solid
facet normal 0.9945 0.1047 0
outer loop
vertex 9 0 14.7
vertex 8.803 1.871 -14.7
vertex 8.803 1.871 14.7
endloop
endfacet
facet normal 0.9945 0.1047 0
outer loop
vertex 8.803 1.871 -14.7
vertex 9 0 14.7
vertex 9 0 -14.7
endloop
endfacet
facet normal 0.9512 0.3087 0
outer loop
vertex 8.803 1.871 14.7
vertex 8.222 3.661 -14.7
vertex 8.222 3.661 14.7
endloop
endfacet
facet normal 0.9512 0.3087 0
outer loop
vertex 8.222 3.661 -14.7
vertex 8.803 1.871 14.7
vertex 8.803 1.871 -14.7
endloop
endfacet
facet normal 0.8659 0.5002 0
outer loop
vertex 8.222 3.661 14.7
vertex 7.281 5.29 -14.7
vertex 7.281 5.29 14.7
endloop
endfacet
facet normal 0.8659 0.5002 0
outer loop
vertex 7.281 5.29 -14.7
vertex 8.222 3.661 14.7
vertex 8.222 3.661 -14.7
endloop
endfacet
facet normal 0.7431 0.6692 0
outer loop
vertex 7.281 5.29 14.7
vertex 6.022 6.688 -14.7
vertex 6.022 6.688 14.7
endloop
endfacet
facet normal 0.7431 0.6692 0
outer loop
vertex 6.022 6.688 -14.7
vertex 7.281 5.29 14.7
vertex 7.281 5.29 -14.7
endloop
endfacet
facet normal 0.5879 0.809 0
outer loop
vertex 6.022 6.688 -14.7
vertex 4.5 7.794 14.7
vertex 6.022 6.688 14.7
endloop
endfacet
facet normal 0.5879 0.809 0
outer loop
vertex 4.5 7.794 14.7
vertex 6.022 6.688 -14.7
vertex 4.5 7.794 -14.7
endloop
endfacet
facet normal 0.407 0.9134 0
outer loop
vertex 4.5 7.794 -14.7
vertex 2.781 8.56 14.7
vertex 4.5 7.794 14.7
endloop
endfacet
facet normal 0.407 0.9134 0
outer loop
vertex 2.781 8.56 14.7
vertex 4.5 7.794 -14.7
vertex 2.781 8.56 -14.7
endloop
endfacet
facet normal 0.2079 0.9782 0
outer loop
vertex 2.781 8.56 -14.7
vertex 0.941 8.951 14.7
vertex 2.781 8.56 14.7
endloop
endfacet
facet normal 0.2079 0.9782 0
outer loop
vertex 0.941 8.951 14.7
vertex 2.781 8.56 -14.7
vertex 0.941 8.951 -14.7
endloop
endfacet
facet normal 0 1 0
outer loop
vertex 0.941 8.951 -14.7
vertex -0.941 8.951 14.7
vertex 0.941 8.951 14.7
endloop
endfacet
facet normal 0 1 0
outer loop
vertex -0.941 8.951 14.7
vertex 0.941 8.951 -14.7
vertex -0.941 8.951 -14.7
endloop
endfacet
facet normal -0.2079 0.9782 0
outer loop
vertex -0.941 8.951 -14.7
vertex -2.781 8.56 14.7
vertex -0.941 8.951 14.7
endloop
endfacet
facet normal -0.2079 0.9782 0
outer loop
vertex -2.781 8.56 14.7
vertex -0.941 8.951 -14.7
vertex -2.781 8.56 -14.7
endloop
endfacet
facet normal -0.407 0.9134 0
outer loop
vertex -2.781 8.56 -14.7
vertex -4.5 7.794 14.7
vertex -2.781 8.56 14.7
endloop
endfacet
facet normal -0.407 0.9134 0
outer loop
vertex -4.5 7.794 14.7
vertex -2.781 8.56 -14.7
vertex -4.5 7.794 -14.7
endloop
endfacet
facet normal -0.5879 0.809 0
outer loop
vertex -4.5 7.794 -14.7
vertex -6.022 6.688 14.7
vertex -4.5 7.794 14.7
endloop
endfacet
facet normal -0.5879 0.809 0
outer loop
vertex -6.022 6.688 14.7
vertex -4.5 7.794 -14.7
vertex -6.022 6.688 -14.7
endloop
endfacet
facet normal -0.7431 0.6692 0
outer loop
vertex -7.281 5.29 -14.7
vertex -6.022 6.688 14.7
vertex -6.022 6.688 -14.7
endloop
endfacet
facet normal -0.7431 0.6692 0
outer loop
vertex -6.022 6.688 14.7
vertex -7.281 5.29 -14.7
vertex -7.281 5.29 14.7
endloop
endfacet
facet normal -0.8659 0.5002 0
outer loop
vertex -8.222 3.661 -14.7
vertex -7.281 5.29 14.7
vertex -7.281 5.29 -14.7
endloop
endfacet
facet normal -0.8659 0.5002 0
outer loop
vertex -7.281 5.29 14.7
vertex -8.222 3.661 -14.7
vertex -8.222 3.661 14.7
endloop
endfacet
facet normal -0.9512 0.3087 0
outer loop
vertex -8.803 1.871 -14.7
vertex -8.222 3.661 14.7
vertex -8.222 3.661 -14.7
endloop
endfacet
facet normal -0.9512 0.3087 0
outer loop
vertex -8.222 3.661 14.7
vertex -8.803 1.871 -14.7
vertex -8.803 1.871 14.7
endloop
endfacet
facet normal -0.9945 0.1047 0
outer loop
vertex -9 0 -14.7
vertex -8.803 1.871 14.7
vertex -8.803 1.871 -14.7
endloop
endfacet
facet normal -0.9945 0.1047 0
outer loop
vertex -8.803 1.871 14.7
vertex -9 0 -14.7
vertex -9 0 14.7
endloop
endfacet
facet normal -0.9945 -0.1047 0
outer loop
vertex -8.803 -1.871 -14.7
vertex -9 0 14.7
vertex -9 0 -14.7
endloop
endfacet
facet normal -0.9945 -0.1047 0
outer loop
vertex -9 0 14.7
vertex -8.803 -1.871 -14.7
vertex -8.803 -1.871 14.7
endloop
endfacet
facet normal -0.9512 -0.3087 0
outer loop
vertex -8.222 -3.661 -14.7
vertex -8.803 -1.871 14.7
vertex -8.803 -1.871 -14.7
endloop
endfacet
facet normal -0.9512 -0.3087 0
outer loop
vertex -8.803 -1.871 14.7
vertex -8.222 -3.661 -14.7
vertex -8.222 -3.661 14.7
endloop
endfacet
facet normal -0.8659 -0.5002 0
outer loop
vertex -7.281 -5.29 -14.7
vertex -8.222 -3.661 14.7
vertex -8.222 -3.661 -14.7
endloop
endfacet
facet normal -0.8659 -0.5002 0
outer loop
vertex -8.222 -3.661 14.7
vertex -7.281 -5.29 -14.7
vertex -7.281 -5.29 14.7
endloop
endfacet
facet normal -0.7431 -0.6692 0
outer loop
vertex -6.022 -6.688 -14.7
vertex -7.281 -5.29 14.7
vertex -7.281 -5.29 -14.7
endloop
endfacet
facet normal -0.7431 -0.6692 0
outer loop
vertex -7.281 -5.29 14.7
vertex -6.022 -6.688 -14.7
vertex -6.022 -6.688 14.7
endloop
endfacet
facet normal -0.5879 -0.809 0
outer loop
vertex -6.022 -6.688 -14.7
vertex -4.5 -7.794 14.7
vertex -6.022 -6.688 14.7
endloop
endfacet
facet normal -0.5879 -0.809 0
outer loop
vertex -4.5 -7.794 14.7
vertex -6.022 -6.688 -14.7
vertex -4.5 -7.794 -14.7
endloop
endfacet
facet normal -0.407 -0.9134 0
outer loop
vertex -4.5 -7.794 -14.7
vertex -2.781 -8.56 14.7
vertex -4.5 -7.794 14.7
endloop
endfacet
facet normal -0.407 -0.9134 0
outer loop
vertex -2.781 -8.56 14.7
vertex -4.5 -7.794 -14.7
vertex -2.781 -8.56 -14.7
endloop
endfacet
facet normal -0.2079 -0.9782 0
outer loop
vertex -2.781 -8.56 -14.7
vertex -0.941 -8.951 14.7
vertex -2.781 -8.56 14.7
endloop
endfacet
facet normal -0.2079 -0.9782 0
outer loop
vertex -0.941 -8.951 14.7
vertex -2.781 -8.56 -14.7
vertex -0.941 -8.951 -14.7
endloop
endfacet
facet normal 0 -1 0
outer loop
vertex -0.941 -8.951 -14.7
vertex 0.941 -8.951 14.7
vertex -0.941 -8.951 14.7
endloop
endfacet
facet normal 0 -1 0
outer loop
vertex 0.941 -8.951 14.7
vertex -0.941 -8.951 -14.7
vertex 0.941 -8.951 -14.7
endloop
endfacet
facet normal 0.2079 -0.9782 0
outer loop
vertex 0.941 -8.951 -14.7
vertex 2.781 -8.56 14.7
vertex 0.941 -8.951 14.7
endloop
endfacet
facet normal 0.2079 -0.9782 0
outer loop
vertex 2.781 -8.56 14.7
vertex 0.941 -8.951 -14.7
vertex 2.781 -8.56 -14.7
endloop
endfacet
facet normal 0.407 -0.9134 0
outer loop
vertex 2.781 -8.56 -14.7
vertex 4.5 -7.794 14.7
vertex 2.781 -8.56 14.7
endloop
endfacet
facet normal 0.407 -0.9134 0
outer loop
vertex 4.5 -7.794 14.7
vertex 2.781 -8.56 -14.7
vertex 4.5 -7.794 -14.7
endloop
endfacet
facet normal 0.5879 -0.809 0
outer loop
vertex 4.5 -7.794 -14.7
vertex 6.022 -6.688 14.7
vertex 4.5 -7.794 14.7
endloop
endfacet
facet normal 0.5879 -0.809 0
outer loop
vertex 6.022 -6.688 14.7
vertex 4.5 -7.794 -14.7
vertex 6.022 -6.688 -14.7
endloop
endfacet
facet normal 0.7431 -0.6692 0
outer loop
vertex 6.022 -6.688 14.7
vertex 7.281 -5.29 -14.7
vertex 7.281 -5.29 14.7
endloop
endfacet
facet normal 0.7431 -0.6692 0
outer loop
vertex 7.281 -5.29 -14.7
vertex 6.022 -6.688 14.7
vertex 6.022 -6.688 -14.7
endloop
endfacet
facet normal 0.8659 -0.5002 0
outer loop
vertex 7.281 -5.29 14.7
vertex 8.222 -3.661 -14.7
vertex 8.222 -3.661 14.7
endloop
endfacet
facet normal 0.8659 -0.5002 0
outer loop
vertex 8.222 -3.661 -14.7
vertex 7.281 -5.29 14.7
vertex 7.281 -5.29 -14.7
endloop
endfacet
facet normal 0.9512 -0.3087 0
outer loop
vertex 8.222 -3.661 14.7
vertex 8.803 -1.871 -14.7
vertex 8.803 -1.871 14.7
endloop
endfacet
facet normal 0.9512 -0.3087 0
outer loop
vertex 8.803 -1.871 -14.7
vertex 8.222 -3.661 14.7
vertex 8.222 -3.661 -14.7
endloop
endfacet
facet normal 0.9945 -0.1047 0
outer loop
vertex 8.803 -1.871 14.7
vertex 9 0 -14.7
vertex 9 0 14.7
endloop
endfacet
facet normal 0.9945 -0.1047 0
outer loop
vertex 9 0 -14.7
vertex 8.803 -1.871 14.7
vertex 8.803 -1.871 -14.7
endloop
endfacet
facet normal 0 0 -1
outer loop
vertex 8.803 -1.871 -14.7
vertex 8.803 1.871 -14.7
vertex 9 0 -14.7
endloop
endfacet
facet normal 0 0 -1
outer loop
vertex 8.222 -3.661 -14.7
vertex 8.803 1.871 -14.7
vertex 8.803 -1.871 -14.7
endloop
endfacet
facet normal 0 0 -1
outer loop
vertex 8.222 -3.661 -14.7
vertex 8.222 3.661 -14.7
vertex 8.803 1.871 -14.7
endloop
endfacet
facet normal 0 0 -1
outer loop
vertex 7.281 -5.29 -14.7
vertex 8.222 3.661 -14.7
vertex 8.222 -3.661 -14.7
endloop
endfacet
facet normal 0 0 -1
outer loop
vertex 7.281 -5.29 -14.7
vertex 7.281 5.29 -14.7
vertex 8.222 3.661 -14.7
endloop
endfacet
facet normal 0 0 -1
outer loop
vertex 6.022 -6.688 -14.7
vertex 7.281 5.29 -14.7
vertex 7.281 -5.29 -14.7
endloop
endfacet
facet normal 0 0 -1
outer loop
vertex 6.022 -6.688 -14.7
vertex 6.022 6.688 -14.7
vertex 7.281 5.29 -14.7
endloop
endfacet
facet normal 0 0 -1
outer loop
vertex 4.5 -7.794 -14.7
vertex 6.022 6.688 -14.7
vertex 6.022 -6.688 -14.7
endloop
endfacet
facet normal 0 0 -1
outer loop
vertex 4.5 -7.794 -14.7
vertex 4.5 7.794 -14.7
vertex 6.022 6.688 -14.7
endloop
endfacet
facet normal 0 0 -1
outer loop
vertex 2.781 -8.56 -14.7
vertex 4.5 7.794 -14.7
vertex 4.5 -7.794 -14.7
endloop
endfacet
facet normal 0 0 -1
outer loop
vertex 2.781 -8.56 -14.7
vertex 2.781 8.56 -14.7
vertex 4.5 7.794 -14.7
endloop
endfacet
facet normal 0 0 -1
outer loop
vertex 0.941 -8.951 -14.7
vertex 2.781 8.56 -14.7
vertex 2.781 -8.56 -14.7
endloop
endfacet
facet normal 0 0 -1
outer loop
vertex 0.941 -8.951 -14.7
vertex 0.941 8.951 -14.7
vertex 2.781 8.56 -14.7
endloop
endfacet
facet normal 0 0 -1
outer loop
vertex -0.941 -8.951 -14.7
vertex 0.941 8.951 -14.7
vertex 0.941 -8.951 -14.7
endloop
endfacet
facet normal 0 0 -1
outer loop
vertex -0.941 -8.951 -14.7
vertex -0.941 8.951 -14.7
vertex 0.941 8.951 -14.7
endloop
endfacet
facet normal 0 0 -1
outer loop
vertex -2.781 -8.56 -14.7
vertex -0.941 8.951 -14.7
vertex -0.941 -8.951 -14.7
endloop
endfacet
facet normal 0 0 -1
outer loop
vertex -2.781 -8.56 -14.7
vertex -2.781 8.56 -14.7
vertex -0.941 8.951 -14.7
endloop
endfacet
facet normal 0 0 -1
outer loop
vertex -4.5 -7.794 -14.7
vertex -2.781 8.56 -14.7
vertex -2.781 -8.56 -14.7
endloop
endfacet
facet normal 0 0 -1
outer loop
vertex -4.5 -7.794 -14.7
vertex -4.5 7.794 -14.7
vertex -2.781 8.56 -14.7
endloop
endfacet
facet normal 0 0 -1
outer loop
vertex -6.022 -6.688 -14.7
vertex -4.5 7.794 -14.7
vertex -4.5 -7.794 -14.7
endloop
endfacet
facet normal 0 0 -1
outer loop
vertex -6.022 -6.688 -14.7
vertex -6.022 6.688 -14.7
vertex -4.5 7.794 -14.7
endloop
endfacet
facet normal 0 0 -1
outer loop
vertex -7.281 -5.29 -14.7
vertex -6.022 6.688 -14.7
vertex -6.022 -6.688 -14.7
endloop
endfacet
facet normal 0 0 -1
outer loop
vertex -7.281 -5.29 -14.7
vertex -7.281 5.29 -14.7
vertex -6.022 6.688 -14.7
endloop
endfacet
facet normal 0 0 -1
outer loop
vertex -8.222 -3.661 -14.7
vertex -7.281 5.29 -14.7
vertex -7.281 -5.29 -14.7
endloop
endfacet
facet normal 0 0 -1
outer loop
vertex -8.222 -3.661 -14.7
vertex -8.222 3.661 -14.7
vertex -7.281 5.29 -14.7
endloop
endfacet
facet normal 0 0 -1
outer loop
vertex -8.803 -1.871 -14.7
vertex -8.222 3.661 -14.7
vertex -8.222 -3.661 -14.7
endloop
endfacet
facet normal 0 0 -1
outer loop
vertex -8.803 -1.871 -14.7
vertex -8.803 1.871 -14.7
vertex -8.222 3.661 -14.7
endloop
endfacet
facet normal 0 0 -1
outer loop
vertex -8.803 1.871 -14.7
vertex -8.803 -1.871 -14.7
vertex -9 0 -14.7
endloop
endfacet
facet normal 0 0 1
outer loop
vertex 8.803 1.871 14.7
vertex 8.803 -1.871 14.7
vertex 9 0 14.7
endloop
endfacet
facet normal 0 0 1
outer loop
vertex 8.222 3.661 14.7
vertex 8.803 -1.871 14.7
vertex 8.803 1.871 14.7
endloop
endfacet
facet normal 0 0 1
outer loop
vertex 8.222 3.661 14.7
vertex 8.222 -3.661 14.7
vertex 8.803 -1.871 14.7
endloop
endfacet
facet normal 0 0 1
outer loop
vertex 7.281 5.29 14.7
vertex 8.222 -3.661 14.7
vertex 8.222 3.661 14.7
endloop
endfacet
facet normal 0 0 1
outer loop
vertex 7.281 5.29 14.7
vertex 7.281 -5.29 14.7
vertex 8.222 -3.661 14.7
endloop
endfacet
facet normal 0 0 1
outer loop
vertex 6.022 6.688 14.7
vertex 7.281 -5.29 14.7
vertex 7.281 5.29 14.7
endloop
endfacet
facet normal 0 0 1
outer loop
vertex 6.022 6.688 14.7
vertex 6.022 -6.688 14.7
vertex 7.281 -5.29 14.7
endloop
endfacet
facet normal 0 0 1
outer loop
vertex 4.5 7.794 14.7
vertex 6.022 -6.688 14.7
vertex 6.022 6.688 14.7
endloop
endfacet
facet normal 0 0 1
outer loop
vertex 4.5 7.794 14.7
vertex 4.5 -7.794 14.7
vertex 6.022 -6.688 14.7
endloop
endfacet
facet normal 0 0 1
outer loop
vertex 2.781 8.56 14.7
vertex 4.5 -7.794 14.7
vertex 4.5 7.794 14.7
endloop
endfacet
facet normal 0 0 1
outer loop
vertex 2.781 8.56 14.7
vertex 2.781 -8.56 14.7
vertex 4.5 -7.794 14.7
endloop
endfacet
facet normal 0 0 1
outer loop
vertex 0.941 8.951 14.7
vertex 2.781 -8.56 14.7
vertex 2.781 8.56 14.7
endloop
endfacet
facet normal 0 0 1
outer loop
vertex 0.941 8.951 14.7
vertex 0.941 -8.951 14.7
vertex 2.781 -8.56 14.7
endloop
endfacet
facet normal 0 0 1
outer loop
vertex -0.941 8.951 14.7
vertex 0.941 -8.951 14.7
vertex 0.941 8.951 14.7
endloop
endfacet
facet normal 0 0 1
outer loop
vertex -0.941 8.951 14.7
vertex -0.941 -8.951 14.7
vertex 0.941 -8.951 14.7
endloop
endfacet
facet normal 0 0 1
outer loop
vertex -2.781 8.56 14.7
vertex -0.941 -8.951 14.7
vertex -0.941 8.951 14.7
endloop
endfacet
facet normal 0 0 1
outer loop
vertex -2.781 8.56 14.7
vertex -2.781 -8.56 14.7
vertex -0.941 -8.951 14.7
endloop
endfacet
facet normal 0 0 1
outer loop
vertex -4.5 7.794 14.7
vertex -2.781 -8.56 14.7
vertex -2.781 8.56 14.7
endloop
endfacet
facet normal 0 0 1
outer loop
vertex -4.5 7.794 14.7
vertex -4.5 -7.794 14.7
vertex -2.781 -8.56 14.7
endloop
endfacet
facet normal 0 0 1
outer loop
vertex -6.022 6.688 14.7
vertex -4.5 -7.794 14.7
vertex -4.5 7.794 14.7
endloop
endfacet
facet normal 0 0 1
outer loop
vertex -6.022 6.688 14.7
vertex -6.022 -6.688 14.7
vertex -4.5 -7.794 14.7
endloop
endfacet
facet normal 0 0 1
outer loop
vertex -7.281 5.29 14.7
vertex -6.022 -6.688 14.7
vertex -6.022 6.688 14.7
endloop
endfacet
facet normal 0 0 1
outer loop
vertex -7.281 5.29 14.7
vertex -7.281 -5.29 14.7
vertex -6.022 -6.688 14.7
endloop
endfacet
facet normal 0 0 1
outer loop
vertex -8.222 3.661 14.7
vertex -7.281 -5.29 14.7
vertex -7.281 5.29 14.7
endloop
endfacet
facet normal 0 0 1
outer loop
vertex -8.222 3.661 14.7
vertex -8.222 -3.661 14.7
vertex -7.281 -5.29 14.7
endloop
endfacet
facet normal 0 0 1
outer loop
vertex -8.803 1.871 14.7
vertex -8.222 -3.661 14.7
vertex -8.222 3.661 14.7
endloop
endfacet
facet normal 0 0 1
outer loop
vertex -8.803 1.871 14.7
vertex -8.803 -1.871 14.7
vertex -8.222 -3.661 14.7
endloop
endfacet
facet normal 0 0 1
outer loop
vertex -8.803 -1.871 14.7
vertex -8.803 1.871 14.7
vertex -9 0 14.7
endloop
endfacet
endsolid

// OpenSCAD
// file: ../settings.scad
// Common settings used by all scad files.

// ALL UNITS IN MILLIMETERS (MM)!!!

$fn = 30;//low-res but fast to render
//$fn = 50;//higher-res but slow to render

pi = 3.1415926535897932384626433832795;

max_footprint = 150; // 15x15 cm

bottom_clearance = 10;
bottom_clearance = 25.4/2+10;
//bottom_clearance = 30;

shell_alpha = 0.215;
//shell_alpha = 1.0;

tolerance = 0.5;

// Flat countersunk M2.5mm x 0.45mm machine screw.
screw_thread_diameter = 2.5;//2.8;//2.75;//2.4?
screw_thread_length = 5;//?
screw_head_diameter = 4.75; // M2.5
//screw_head_diameter = 5.2; // M3
screw_head_height = 1.5;//2;

screw_thread_diameter2 = 2;

unit_thickness = 5;
u = unit_thickness;

shell_thickness = unit_thickness;

// Show flags.
show_platform = 0;
show_head = 1;
show_head_shell = 0;
show_head_electronics_bb = 0;
show_battery = 1;
show_foot_cube = 0;
show_torso = 0;
show_motor = 0;
show_motor_plates = 1;
show_motor_inner_plates = 1;
show_motor_outer_plates = 1;
show_wheel = 0;//obsolete
show_tracks = 1;//
show_track_wheels = 1;
show_caster = 0;
show_rpi = 1;
show_vertical_plates = 1;//
show_horizontal_plates = 1;//
show_caster_plates = 0;//obsolete?
show_camera = 1;
show_screen = 0;
show_edge_mount = 1;
show_sonar_mount = 1;
show_recharge_mount = 1;
show_conduit = 1;
show_torso_shell = 1;
show_recharge_dock = 0;
show_head_tilt_axis = 0;
show_rpi_camera_axis = 0;
show_laser_axis = 0;

head_vertical_angle_tilt = 0;
//head_vertical_angle_tilt = 30;//max
//head_vertical_angle_tilt = 10;

torso_height = 120+20;

base_plate_diameter = max_footprint-unit_thickness*2;
base_plate_frame = 0;

head_height = 50;
head_offset_z = max_footprint/2;
head_middle_cutout = 85;

rpi_with_four_hats_and_clearance = 76;

qrd1114_w = 6.10;
qrd1114_l = 4.39;
qrd1114_h = 4.65;

dock_radius = 10;
dock_gripper_border = 2;
dock_gripper_instep = 0.9;
dock_gripper_cutout_tapper = 50;
dock_receiver_height = 5;

// Patriod Fuel+ 9000 mAh
battery_length = 90;
battery_width = 57;
battery_height = 23;
battery_offset_z = 30;//4;

wheel_diameter = 50;
wheel_offset_x = 65;
wheel_offset_z = wheel_diameter/2;
wheel_axle_diameter = 5;

//caster_diameter = 19.05; // 0.75 inches
caster_diameter = 25.45; // 1 inches
//caster_diameter = 15.875; // 5/8 inches
caster_holder_diameter = 30;//31;
caster_offset_y = base_plate_diameter/2 - caster_holder_diameter/2;

arduino_offset_x = 0;
arduino_offset_y = 0;
arduino_offset_z = 67;
arduino_offset_x2 = 0;
arduino_offset_y2 = -20;
arduino_offset_z2 = torso_height+bottom_clearance;

horizontal_plate_width = unit_thickness*8*2 - unit_thickness*2;
horizontal_plate_depth = unit_thickness*8*2;

vertical_plate_width = horizontal_plate_depth;
vertical_plate_height = unit_thickness*8;
vertical_plate_offset_x = wheel_offset_x-22.5;
vertical_plate_offset_z = vertical_plate_height/2 + unit_thickness/2;

vertical_battery_plate_height = 100 - 15;

caster_plate_width = horizontal_plate_width + unit_thickness*2;
caster_plate_mount_length = unit_thickness*4;
caster_plate_width_minor = caster_holder_diameter;

motor_switch_length = 20;
motor_switch_thickness = 6.5;
motor_switch_height = 11;
motor_switch_height_leads = 23;
motor_switch_on_height =  13.3;
motor_switch_hole_diameter = 2.5;
motor_switch_hole_offset_z = 6.5;//this plus diameter/2 is hole center from switch top
motor_switch_hole_spacing = 7.1;// holes are diameter/2 from this

motor_length = 60;
motor_width = 25;
motor_collar_width = 7;
motor_collar_height = 2.5;
motor_axle_width = 4;
motor_axle_height = 9.5;
motor_offset_x = 10;
//motor_offset_y = motor_width/2+5;
motor_offset_y = unit_thickness*3.5;
motor_offset_z = vertical_plate_height/2 - unit_thickness/2;//4;//30;
motor_mount_holes_dist = 17;
// motor countersink hole
motor_mount_holes_width = 3; // M3
motor_mount_holes_head_height = 2.2;
motor_mount_holes_head_width = 5.8;
motor_bearing_outer_diameter = 10;
motor_bearing_inner_diameter = 5.95;
motor_bearing_thickness = 2.5;

motor_unimount_idler_axle_d = screw_thread_diameter;
//motor_unimount_spacer_depth = 0.1;//too small
motor_unimount_spacer_depth = 0.5;

motor_arm_offset_y = -u*3;
motor_arm_offset_z = u*.5;

motor_plate_width = vertical_plate_width;
motor_plate_height = vertical_plate_height;
motor_plate_thickness = unit_thickness;
motor_plate_offset_z = vertical_plate_offset_z;

motor_plate_middle_thickness = 5;

wheel_hub_offset = u*3;

motor_hole_height_offset = -5;

nylon_spacer_outer_diameter = 6.35;
nylon_spacer_inner_diameter = 3.302;
nylon_spacer_length = 12.7;

track_width = unit_thickness*3;
track_offset_x = -50;
track_offset_z = .1;
//track_wheel_radius = 19;//original
track_wheel_radius = 14;
//track_wheel_hole_radius = (nylon_spacer_outer_diameter+1)/2;
track_wheel_hole_radius = motor_bearing_outer_diameter/2;

track_driver_hole_radius = (motor_axle_width)/2 + 0.1;
track_driver_set_screw_head_d = 4.1;
track_driver_set_screw_shaft_d = 2.4;
//track_wheel_width = 13.5;//original
track_wheel_width = u*2;
track_wheel_width_buffer = u*0.25;
track_offset = 3;        //distance from chassis
track_wheel_offset = track_offset;
//track_length = 250; // see tread_triangle.py, too big
//track_length = 240; // see tread_triangle.py
//track_length = 238; //inc/dec in 10 unit increments so notches match idlers
track_length = 228; //inc/dec in 10 unit increments so notches match idlers
track_radius = track_length/2/pi;
track_wheel_show_fancy = 1;
track_wheel_gap = track_wheel_width + track_wheel_width_buffer*2;
track_axle_bearing_diameter = motor_bearing_inner_diameter - 0.1;
track_tensioner_radius = 12;
track_nut_height = 3.5; //TODO
track_punchout_thickness = 0.25;//should be the same as the minimum layer thickness

head_slew_bearing_outer_diameter = 115;
head_slew_bearing_ring_thickness = 20;
head_slew_bearing_inner_diameter = head_slew_bearing_outer_diameter - head_slew_bearing_ring_thickness;
//head_slew_bearing_hole_diameter = head_slew_bearing_inner_diameter - head_slew_bearing_ring_thickness;
head_slew_bearing_hole_diameter = 12+tolerance; // slip ring https://www.adafruit.com/products/775
//head_slew_bearing_ball_diameter = 5;
head_slew_bearing_ball_diameter = 2.5; //u/2;
head_slew_bearing_height = u;//head_slew_bearing_ball_diameter*2;
head_slew_bearing_gap = 0.5;
head_slew_bearing_slew_gap = 0;
head_slew_bearing_gap_factor = 0.1;

neck_strut_width = u*7;
neck_strut_height = u*18;
neck_strut_spacing = u*8;

show_outer_race = 0;
show_inner_race_a = 1;
show_inner_race_b = 1;
show_balls = 0;
// main file
include <../settings.scad>;

//https://www.adafruit.com/products/1439
module make_pololu_pushbutton_1439(){
    
    cylinder(d=18, h=29.4, center=true);
    
}
    
make_pololu_pushbutton_1439();
